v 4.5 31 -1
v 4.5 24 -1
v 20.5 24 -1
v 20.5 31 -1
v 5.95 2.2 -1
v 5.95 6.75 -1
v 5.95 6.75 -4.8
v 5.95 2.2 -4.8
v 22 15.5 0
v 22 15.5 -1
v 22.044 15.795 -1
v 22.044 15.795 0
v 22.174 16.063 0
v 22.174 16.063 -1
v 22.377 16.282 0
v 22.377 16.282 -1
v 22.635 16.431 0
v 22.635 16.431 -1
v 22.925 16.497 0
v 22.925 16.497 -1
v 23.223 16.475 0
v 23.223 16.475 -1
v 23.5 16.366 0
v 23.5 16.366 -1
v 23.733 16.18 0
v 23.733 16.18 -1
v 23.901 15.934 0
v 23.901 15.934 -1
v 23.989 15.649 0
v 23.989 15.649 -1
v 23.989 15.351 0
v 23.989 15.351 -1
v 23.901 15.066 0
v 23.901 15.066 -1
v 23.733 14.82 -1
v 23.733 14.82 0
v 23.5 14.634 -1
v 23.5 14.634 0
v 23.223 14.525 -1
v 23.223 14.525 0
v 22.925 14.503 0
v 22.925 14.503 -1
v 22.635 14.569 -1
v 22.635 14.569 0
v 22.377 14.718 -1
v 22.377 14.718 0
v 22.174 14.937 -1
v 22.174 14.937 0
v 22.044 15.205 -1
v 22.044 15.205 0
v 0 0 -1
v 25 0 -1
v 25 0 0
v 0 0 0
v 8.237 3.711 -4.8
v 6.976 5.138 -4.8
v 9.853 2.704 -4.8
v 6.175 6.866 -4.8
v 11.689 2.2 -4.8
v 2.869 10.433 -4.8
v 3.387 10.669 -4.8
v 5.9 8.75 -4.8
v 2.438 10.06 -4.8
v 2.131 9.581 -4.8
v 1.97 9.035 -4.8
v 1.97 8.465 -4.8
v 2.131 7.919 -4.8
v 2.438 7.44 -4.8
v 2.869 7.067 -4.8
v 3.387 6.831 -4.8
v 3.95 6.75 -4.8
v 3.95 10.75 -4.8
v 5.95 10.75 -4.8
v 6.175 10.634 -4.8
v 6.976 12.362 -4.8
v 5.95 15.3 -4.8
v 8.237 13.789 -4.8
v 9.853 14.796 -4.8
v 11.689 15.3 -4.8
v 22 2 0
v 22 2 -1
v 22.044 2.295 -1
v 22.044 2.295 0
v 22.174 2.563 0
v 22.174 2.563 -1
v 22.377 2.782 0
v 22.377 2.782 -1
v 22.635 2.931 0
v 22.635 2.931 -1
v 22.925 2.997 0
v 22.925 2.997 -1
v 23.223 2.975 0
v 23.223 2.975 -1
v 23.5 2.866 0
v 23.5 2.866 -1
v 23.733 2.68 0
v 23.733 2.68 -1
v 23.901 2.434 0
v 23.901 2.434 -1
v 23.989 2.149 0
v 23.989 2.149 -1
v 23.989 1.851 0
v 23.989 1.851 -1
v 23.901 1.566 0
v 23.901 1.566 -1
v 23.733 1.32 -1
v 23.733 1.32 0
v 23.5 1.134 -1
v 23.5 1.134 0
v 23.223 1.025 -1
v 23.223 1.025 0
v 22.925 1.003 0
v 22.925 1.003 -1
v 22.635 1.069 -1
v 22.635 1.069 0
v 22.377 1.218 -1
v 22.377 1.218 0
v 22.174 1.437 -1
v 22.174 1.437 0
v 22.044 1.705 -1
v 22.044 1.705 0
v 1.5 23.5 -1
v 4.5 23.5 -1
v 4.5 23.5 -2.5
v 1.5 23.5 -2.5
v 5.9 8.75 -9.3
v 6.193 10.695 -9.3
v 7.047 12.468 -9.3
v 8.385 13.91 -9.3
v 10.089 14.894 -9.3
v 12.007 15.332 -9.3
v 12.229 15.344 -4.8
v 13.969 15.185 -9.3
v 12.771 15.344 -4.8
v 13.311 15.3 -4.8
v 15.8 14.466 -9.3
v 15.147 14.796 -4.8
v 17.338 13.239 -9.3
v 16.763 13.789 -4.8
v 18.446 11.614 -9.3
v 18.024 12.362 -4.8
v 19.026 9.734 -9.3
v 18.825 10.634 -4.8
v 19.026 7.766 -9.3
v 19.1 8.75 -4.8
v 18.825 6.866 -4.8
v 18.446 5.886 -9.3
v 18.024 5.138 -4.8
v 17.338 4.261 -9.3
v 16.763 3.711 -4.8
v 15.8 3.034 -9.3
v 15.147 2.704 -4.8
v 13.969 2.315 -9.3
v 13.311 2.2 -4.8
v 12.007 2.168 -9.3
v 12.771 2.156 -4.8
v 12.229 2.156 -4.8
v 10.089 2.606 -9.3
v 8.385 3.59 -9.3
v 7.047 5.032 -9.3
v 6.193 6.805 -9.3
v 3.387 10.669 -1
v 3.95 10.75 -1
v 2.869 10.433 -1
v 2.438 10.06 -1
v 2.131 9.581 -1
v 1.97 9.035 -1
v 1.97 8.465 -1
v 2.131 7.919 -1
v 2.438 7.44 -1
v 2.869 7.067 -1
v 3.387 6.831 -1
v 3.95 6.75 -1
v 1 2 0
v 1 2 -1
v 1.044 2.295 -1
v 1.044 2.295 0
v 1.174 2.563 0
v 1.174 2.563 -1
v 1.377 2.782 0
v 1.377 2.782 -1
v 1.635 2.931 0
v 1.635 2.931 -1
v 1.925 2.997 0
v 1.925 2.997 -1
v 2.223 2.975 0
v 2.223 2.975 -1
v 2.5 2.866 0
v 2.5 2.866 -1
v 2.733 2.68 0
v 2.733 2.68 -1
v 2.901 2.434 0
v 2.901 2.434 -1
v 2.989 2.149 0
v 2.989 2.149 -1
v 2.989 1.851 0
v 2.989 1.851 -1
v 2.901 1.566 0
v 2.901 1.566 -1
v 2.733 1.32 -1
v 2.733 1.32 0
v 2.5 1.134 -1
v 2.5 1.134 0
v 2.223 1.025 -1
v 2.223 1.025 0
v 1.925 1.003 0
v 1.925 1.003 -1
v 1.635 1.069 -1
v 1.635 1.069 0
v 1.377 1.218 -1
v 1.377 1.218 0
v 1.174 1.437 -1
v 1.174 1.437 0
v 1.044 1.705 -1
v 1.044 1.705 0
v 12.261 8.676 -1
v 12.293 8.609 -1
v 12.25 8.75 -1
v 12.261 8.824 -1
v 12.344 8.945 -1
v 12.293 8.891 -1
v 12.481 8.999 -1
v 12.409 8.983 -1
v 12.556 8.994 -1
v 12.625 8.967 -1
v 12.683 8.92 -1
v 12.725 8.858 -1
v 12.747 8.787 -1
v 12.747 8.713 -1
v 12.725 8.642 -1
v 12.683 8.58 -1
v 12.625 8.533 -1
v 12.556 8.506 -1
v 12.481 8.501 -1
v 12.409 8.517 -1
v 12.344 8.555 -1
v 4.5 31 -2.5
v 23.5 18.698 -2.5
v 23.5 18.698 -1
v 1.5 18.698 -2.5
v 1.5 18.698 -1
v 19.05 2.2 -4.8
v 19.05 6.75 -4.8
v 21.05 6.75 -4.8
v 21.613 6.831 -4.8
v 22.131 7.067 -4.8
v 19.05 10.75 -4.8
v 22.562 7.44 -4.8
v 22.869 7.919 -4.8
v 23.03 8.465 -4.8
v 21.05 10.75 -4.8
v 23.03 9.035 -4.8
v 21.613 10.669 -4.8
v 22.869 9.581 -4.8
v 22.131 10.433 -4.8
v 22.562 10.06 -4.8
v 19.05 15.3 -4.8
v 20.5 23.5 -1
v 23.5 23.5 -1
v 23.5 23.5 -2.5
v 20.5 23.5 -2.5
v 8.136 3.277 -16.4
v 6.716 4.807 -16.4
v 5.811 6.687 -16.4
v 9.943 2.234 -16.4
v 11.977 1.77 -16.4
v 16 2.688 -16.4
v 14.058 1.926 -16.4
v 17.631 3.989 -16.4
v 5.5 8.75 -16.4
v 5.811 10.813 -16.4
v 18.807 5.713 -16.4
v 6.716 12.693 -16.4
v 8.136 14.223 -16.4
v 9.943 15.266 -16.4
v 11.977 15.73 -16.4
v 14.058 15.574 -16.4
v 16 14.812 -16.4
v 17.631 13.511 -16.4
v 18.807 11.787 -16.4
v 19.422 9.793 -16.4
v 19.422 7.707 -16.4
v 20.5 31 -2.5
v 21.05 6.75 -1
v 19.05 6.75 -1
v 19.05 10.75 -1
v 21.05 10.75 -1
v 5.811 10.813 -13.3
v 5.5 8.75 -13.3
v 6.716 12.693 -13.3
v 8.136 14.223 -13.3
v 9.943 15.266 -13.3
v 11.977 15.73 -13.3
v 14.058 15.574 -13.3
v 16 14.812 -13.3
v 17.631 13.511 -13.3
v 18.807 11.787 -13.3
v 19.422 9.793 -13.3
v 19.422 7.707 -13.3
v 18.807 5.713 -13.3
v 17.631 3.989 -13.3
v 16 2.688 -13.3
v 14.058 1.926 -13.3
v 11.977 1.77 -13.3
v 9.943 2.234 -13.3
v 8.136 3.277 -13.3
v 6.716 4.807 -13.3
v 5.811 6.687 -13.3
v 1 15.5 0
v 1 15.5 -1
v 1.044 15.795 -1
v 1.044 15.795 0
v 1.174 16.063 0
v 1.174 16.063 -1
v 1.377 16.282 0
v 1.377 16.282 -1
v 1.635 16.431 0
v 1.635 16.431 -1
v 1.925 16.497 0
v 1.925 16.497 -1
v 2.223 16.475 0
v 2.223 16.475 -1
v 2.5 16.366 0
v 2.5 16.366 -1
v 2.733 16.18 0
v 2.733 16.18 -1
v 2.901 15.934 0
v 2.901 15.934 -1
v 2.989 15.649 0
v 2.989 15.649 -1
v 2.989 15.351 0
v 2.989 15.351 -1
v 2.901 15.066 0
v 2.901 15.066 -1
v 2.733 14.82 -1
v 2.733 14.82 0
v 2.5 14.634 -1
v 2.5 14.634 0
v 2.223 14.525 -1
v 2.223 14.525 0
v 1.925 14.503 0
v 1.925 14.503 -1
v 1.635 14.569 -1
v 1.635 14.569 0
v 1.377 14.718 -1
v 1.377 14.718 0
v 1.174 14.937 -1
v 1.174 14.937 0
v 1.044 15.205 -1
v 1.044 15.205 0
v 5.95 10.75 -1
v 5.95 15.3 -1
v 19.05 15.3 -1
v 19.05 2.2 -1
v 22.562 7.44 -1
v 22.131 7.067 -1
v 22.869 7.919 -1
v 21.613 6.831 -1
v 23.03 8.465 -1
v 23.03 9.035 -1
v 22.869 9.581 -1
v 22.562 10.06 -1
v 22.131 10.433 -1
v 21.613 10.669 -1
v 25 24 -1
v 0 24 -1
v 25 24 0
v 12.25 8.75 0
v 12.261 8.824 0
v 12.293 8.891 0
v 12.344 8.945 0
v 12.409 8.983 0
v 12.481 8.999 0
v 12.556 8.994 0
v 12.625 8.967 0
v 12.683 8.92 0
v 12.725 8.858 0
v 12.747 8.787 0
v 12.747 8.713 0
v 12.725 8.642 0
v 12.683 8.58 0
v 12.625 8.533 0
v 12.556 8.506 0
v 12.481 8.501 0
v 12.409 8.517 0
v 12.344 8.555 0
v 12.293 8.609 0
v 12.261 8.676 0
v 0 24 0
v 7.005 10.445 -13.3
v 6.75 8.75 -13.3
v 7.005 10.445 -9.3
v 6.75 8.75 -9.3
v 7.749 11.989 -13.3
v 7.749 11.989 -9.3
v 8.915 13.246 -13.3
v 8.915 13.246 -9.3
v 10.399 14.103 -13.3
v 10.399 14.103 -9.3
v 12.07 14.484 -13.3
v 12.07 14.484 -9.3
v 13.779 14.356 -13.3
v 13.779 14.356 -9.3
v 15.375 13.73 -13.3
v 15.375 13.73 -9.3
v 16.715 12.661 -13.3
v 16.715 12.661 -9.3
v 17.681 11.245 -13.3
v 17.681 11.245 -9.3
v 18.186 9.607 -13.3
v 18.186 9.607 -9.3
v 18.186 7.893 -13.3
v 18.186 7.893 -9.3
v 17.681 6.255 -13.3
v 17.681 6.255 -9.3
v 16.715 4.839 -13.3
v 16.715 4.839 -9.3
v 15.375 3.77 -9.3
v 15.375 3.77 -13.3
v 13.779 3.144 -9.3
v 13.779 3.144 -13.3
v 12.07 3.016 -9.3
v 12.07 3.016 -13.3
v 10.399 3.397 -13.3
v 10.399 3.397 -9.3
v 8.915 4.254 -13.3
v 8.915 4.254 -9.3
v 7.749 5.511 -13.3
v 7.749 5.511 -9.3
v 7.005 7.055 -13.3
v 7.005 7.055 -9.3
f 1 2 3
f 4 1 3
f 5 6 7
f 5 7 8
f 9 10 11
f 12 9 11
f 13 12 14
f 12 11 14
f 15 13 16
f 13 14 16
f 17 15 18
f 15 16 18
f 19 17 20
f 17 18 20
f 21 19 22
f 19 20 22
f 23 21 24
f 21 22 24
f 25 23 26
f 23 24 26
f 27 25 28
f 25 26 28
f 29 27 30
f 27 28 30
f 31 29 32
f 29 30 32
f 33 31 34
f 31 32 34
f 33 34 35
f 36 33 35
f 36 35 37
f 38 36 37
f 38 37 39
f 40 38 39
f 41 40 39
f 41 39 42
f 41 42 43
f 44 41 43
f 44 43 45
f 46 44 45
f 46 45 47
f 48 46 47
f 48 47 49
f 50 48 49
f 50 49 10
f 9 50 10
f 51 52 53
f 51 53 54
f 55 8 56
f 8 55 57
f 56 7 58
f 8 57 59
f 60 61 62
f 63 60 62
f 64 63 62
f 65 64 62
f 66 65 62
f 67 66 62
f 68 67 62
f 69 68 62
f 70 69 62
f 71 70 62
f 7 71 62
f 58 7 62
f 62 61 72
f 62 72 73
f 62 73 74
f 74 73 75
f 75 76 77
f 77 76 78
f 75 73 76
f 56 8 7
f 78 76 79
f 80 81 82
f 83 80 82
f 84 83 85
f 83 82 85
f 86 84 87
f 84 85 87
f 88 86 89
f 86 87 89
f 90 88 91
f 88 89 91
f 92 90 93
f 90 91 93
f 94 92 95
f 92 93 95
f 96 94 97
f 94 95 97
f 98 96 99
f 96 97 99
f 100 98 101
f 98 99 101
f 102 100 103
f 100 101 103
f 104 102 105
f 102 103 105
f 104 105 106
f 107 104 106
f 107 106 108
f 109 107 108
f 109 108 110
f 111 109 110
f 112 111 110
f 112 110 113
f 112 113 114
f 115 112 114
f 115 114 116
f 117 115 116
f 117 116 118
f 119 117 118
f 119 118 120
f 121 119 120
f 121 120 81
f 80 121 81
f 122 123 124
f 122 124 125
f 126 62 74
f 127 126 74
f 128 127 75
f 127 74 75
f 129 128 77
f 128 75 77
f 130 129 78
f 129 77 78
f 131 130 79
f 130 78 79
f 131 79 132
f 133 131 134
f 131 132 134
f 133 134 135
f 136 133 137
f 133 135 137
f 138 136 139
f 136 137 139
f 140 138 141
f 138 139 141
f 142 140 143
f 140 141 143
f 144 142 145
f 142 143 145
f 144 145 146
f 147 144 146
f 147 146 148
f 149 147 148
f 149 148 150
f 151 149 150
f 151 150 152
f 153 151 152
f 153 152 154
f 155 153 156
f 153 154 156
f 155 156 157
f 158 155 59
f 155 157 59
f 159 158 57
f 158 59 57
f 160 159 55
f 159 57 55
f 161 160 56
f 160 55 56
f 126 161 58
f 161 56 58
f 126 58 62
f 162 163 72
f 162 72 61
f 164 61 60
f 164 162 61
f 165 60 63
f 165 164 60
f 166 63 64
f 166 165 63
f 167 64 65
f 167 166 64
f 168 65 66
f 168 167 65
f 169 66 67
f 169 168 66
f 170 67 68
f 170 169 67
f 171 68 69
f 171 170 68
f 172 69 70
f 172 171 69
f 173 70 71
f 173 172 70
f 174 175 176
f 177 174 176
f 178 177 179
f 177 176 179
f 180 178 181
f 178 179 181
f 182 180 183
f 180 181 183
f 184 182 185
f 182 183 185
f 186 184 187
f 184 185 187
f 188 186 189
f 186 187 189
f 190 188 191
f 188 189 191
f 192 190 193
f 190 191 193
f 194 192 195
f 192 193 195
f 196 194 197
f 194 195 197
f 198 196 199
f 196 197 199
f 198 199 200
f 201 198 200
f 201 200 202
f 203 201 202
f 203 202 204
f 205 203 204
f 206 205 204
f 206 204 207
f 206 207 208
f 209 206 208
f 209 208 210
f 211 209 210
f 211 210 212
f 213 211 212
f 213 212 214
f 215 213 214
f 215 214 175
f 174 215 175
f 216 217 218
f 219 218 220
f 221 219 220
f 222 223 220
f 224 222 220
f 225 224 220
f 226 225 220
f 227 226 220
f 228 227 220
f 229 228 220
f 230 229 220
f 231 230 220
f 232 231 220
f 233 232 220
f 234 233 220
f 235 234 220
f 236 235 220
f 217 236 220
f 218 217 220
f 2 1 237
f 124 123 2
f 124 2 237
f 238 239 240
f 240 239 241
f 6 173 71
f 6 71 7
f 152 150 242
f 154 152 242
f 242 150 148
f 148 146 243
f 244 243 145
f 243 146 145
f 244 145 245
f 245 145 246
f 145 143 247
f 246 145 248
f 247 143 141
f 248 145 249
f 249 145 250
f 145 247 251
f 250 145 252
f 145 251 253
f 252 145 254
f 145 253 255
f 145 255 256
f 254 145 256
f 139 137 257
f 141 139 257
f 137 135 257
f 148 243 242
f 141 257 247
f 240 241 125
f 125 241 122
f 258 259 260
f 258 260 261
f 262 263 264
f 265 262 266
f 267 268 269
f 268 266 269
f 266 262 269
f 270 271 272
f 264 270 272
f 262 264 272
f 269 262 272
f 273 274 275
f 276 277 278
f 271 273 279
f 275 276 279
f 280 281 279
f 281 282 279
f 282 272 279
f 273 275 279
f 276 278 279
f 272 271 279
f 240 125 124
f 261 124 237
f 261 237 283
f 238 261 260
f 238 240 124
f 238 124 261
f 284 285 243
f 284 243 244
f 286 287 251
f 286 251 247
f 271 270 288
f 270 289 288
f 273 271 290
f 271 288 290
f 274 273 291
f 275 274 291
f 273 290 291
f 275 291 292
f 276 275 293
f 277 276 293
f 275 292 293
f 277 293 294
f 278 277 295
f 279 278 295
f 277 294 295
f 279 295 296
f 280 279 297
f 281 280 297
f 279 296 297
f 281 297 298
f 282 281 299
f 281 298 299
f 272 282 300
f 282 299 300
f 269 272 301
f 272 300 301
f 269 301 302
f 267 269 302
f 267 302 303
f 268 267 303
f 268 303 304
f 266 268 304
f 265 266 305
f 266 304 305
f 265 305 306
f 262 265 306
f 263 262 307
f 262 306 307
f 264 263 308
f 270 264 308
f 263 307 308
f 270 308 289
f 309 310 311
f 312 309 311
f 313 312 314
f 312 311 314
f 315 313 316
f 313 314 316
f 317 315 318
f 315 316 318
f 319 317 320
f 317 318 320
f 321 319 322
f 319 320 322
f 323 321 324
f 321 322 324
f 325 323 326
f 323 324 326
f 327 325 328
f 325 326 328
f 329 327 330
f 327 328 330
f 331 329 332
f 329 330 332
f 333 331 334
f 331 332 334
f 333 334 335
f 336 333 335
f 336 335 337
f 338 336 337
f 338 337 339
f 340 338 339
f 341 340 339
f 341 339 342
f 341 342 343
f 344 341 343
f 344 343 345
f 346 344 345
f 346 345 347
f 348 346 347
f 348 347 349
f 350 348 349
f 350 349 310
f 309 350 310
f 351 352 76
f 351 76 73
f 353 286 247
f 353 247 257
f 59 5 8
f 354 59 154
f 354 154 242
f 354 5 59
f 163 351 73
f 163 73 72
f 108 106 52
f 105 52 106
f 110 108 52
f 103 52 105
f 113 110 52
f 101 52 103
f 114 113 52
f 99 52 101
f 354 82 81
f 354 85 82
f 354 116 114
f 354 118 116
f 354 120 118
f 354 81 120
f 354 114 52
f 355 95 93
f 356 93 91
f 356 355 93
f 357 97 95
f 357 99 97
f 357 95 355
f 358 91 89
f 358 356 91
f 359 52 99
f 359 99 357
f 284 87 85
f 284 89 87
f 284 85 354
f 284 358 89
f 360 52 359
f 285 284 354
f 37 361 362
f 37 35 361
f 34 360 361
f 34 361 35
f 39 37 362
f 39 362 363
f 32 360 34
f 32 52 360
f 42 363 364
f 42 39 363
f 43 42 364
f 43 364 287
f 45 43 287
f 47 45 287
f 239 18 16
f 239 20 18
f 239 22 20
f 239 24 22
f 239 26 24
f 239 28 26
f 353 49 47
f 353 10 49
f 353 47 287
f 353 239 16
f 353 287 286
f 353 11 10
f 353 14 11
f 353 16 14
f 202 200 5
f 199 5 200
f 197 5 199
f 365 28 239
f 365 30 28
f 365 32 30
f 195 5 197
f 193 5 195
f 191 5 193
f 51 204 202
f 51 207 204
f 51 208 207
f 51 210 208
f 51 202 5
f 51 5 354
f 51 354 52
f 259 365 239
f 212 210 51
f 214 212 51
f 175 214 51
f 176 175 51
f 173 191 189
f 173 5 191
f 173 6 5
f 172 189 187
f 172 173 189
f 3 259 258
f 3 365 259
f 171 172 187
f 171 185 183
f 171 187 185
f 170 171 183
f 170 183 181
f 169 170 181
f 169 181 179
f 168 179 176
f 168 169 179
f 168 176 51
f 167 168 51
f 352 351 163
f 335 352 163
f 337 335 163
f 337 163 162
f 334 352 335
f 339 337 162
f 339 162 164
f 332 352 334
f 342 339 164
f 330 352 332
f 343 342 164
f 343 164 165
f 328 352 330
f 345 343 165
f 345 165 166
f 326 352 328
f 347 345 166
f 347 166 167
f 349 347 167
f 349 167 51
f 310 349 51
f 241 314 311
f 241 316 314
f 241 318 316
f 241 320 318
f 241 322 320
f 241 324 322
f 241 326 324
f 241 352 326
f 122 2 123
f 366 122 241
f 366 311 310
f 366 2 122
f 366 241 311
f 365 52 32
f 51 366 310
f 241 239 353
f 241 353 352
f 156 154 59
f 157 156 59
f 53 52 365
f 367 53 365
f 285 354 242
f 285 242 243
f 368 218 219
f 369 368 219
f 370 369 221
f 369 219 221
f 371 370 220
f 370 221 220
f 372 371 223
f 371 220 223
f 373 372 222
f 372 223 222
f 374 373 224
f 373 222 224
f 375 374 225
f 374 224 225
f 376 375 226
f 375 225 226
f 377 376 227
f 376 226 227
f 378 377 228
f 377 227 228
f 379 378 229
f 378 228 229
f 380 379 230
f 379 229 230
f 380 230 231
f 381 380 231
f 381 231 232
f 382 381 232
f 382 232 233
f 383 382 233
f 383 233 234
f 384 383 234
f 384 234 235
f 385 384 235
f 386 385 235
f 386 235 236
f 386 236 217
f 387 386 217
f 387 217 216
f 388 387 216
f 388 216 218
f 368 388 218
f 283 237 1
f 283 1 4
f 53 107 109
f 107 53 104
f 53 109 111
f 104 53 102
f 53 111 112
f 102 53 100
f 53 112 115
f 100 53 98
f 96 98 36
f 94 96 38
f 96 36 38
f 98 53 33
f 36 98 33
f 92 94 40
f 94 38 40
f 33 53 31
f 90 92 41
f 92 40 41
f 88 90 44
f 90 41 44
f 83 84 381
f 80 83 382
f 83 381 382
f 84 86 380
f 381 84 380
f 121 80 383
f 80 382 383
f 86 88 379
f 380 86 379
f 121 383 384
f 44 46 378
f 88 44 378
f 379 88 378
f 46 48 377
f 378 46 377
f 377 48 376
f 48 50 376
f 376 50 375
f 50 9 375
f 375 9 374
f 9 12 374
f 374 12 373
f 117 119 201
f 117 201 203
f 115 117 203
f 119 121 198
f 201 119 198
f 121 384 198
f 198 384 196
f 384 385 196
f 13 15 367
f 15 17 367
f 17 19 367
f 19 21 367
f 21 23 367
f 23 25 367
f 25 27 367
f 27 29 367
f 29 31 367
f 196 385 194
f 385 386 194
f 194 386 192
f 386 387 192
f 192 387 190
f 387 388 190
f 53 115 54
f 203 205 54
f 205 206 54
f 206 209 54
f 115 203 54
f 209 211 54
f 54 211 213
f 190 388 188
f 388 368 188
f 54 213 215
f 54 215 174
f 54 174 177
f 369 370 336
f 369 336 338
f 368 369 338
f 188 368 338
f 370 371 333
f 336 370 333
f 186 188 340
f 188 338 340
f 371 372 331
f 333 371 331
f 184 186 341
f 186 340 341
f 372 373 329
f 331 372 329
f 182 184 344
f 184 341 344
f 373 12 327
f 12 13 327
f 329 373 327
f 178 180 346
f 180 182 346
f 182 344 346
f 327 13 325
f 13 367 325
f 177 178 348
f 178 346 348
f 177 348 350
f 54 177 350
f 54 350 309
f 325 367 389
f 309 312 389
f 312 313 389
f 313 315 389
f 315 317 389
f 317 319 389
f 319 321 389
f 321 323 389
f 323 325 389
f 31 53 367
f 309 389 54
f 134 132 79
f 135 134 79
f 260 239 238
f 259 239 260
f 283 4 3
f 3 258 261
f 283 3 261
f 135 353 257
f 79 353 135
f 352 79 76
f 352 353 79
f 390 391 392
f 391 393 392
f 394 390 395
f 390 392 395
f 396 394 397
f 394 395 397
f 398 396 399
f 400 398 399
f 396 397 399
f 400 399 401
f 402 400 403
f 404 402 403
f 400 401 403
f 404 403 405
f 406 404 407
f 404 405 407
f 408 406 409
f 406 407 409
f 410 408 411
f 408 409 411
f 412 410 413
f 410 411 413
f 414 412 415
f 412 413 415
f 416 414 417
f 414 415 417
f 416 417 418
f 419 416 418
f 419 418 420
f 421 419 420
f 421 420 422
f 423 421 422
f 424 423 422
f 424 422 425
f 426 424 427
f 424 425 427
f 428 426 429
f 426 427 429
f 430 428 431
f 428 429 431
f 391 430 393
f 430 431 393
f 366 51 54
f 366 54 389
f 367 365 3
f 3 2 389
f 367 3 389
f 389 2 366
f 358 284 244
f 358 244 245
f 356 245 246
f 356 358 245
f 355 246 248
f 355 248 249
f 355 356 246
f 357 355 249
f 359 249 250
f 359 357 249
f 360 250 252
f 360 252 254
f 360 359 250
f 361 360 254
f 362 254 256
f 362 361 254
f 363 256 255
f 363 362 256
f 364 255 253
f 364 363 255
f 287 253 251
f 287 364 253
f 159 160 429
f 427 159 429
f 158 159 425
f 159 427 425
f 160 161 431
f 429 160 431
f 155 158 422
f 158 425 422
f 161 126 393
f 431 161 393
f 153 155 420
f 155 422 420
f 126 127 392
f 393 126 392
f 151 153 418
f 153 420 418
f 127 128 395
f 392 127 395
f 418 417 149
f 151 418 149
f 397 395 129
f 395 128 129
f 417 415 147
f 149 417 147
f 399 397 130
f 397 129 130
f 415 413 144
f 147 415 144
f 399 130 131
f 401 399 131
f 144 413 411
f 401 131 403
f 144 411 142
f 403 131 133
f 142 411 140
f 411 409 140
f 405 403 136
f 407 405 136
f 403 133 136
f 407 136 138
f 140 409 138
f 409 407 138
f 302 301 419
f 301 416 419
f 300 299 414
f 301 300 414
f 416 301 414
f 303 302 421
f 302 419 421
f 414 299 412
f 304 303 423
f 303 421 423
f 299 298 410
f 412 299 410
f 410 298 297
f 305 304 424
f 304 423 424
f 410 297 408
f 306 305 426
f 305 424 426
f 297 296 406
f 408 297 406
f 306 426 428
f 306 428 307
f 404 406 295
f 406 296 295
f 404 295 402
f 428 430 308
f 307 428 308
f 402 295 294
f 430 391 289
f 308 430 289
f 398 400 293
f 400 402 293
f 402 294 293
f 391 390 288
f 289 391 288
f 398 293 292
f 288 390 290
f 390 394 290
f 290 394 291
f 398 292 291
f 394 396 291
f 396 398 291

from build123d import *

# Parameters (mm, degrees)
SKETCH_1_W             = 25
SKETCH_1_H             = 24
EXTRUDE_354_DEPTH      = 1
EXTRUDE_536_DEPTH      = 3.8
SKETCH_3_W             = 22
SKETCH_3_H             = 4.802295703
EXTRUDE_803_DEPTH      = 1.5
HOLE_WIZARD_953_D      = 0.5
HOLE_WIZARD_953_DEPTH  = 1
HOLE_WIZARD_1615_D     = 2
HOLE_WIZARD_1615_DEPTH = 16.4
SKETCH_12_W            = 16
SKETCH_12_H            = 1.5
EXTRUDE_2779_DEPTH     = 7.5


with BuildPart() as part:
    # Эскиз1 → Extrude 354 (new body)
    with BuildSketch(Plane(origin=(0, 0, -1), x_dir=(-1, 0, 0), z_dir=(0, 0, -1))):
        with Locations((-12.5, 12)):
            Rectangle(SKETCH_1_W, SKETCH_1_H)
    extrude(amount=-EXTRUDE_354_DEPTH)

    # Эскиз2 → Extrude 536 (add)
    with BuildSketch(Plane(origin=(0, 0, -1), x_dir=(-1, 0, 0), z_dir=(0, 0, -1))):
        with BuildLine():
            Line((-5.95, 10.75), (-3.949995117, 10.75))
            ThreePointArc((-3.949995117, 10.75), (-1.949995117, 8.75), (-3.949995117, 6.75))
            Line((-3.949995117, 6.75), (-5.95, 6.75))
            Line((-5.95, 6.75), (-5.95, 2.2))
            Line((-5.95, 2.2), (-19.05, 2.2))
            Line((-19.05, 2.2), (-19.05, 6.75))
            Line((-19.05, 6.75), (-21.050009766, 6.75))
            ThreePointArc((-21.050009766, 6.75), (-23.050009766, 8.75), (-21.050009766, 10.75))
            Line((-21.050009766, 10.75), (-19.05, 10.75))
            Line((-19.05, 10.75), (-19.05, 15.3))
            Line((-19.05, 15.3), (-5.95, 15.3))
            Line((-5.95, 15.3), (-5.95, 10.75))
        make_face()
    extrude(amount=EXTRUDE_536_DEPTH)

    # Эскиз3 → Extrude 803 (add)
    with BuildSketch(Plane(origin=(0, 0, -1), x_dir=(-1, 0, 0), z_dir=(0, 0, -1))):
        with Locations((-12.5, 21.098852149)):
            Rectangle(SKETCH_3_W, SKETCH_3_H)
    extrude(amount=EXTRUDE_803_DEPTH)

    # Эскиз4 → Revolve 894 (revolve)
    with BuildSketch(Plane.XZ.offset(-8.75), mode=Mode.PRIVATE) as revolve_894_sk:
        Polygon((19.1, -4.8), (12.5, -4.8), (12.5, -16.4), (19.5, -16.4), (19.5, -13.3), (18.25, -13.3), (18.25, -9.3), (19.1, -9.3), align=None)
    revolve(revolve_894_sk.sketch.rotate(Axis((12.5, 8.75, -4.8), (0, 0, -1)), 180), axis=Axis((12.5, 8.75, -4.8), (0, 0, -1)))

    # Hole Wizard 953
    with Locations(Plane.XY):
        with Locations((12.5, 8.75)):
            Hole(HOLE_WIZARD_953_D / 2, depth=HOLE_WIZARD_953_DEPTH)

    # Hole Wizard 1615
    with Locations(Plane.XY):
        with Locations((2, 2), (2, 15.5), (23, 15.5), (23, 2)):
            Hole(HOLE_WIZARD_1615_D / 2, depth=HOLE_WIZARD_1615_DEPTH)

    # Эскиз12 → Extrude 2779 (add)
    with BuildSketch(Plane(origin=(0, 23.5, 0), x_dir=(1, 0, 0), z_dir=(0, 1, 0))):
        with Locations((12.5, 1.75)):
            Rectangle(SKETCH_12_W, SKETCH_12_H)
    extrude(amount=EXTRUDE_2779_DEPTH)


solid = part.part
